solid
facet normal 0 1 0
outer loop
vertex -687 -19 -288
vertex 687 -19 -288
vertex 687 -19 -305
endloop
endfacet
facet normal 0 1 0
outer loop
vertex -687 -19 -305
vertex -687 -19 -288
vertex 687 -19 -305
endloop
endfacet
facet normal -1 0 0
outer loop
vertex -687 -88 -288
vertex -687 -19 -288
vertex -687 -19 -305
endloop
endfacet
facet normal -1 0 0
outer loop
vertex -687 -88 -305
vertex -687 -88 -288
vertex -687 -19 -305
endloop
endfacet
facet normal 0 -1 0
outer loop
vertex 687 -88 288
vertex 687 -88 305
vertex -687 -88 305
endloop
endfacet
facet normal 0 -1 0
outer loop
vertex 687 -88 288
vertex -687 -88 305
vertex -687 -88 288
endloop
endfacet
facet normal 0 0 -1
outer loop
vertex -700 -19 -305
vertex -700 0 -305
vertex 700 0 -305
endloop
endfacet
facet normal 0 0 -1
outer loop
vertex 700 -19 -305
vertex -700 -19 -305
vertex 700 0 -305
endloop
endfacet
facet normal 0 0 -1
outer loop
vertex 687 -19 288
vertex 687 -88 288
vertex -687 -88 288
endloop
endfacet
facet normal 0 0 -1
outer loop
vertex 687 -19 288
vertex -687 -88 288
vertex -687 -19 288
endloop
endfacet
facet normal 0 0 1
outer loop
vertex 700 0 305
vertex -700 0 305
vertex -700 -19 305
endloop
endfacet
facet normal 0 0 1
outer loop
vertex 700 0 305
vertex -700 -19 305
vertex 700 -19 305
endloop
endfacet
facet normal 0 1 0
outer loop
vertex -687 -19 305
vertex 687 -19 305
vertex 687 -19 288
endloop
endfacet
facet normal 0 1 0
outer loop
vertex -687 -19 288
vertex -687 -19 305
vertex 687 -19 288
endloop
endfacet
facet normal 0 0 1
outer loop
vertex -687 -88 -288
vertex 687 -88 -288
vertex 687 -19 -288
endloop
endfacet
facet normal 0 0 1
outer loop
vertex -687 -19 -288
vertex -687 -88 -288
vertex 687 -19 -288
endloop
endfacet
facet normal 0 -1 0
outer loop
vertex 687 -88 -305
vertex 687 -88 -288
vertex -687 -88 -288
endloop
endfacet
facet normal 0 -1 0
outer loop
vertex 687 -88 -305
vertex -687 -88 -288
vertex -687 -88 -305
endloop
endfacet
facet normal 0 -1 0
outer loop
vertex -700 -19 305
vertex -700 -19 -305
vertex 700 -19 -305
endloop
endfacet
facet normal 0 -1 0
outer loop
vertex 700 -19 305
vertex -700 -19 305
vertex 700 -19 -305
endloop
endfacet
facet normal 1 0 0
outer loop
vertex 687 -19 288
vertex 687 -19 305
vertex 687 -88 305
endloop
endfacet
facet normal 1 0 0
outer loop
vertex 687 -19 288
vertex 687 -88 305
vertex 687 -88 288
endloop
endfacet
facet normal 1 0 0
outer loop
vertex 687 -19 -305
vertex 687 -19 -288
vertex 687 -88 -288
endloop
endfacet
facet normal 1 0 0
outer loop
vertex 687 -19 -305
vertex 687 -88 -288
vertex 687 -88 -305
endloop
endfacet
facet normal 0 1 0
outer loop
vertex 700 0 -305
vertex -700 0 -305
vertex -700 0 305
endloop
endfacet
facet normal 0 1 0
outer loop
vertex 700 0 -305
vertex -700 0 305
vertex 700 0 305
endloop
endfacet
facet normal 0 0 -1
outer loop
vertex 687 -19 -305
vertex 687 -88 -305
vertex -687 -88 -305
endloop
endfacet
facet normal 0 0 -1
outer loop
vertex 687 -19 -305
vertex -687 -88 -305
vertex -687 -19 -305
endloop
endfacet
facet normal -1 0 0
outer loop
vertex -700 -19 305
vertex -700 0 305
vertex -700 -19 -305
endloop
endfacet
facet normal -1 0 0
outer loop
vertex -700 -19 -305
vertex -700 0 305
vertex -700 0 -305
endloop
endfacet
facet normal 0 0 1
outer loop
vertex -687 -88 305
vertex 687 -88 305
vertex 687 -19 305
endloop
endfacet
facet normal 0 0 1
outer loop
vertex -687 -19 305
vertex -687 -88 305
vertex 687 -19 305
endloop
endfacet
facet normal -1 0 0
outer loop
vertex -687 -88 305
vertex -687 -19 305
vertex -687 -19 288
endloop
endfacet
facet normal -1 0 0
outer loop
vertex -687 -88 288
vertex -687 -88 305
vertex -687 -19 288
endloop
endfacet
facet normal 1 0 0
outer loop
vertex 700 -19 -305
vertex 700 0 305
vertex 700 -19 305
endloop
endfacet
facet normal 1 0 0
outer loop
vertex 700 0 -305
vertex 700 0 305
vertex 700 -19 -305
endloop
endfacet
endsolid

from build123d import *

# Parameters (mm, degrees)
SKETCH1_W             = 1400
SKETCH1_H             = 610
BOSS_EXTRUDE1_DEPTH   = 19
BOSS_EXTRUDE2_START   = -13
SKETCH2_W             = 17
SKETCH2_H             = 69
BOSS_EXTRUDE2_DEPTH   = 1374
BOSS_EXTRUDE2_2_DEPTH = 1374


with BuildPart() as part:
    # Sketch1 → Boss-Extrude1 (new body)
    with BuildSketch(Plane(origin=(0, 0, 0), x_dir=(1, 0, 0), z_dir=(0, 1, 0))):
        Rectangle(SKETCH1_W, SKETCH1_H)
    extrude(amount=-BOSS_EXTRUDE1_DEPTH)


with BuildPart() as body_2:
    # Sketch2 → Boss-Extrude2 (new body)
    with BuildSketch(Plane(origin=(700, 0, 0), x_dir=(0, 0, -1), z_dir=(1, 0, 0)).offset(BOSS_EXTRUDE2_START)):
        with Locations((-296.5, -53.5)):
            Rectangle(SKETCH2_W, SKETCH2_H)
    extrude(amount=-BOSS_EXTRUDE2_DEPTH)


with BuildPart() as body_3:
    # Sketch2 → Boss-Extrude2 2 (new body)
    with BuildSketch(Plane(origin=(700, 0, 0), x_dir=(0, 0, -1), z_dir=(1, 0, 0)).offset(BOSS_EXTRUDE2_START)):
        with Locations((296.5, -53.5)):
            Rectangle(SKETCH2_W, SKETCH2_H)
    extrude(amount=-BOSS_EXTRUDE2_2_DEPTH)


solid = Compound([part.part, body_2.part, body_3.part])
